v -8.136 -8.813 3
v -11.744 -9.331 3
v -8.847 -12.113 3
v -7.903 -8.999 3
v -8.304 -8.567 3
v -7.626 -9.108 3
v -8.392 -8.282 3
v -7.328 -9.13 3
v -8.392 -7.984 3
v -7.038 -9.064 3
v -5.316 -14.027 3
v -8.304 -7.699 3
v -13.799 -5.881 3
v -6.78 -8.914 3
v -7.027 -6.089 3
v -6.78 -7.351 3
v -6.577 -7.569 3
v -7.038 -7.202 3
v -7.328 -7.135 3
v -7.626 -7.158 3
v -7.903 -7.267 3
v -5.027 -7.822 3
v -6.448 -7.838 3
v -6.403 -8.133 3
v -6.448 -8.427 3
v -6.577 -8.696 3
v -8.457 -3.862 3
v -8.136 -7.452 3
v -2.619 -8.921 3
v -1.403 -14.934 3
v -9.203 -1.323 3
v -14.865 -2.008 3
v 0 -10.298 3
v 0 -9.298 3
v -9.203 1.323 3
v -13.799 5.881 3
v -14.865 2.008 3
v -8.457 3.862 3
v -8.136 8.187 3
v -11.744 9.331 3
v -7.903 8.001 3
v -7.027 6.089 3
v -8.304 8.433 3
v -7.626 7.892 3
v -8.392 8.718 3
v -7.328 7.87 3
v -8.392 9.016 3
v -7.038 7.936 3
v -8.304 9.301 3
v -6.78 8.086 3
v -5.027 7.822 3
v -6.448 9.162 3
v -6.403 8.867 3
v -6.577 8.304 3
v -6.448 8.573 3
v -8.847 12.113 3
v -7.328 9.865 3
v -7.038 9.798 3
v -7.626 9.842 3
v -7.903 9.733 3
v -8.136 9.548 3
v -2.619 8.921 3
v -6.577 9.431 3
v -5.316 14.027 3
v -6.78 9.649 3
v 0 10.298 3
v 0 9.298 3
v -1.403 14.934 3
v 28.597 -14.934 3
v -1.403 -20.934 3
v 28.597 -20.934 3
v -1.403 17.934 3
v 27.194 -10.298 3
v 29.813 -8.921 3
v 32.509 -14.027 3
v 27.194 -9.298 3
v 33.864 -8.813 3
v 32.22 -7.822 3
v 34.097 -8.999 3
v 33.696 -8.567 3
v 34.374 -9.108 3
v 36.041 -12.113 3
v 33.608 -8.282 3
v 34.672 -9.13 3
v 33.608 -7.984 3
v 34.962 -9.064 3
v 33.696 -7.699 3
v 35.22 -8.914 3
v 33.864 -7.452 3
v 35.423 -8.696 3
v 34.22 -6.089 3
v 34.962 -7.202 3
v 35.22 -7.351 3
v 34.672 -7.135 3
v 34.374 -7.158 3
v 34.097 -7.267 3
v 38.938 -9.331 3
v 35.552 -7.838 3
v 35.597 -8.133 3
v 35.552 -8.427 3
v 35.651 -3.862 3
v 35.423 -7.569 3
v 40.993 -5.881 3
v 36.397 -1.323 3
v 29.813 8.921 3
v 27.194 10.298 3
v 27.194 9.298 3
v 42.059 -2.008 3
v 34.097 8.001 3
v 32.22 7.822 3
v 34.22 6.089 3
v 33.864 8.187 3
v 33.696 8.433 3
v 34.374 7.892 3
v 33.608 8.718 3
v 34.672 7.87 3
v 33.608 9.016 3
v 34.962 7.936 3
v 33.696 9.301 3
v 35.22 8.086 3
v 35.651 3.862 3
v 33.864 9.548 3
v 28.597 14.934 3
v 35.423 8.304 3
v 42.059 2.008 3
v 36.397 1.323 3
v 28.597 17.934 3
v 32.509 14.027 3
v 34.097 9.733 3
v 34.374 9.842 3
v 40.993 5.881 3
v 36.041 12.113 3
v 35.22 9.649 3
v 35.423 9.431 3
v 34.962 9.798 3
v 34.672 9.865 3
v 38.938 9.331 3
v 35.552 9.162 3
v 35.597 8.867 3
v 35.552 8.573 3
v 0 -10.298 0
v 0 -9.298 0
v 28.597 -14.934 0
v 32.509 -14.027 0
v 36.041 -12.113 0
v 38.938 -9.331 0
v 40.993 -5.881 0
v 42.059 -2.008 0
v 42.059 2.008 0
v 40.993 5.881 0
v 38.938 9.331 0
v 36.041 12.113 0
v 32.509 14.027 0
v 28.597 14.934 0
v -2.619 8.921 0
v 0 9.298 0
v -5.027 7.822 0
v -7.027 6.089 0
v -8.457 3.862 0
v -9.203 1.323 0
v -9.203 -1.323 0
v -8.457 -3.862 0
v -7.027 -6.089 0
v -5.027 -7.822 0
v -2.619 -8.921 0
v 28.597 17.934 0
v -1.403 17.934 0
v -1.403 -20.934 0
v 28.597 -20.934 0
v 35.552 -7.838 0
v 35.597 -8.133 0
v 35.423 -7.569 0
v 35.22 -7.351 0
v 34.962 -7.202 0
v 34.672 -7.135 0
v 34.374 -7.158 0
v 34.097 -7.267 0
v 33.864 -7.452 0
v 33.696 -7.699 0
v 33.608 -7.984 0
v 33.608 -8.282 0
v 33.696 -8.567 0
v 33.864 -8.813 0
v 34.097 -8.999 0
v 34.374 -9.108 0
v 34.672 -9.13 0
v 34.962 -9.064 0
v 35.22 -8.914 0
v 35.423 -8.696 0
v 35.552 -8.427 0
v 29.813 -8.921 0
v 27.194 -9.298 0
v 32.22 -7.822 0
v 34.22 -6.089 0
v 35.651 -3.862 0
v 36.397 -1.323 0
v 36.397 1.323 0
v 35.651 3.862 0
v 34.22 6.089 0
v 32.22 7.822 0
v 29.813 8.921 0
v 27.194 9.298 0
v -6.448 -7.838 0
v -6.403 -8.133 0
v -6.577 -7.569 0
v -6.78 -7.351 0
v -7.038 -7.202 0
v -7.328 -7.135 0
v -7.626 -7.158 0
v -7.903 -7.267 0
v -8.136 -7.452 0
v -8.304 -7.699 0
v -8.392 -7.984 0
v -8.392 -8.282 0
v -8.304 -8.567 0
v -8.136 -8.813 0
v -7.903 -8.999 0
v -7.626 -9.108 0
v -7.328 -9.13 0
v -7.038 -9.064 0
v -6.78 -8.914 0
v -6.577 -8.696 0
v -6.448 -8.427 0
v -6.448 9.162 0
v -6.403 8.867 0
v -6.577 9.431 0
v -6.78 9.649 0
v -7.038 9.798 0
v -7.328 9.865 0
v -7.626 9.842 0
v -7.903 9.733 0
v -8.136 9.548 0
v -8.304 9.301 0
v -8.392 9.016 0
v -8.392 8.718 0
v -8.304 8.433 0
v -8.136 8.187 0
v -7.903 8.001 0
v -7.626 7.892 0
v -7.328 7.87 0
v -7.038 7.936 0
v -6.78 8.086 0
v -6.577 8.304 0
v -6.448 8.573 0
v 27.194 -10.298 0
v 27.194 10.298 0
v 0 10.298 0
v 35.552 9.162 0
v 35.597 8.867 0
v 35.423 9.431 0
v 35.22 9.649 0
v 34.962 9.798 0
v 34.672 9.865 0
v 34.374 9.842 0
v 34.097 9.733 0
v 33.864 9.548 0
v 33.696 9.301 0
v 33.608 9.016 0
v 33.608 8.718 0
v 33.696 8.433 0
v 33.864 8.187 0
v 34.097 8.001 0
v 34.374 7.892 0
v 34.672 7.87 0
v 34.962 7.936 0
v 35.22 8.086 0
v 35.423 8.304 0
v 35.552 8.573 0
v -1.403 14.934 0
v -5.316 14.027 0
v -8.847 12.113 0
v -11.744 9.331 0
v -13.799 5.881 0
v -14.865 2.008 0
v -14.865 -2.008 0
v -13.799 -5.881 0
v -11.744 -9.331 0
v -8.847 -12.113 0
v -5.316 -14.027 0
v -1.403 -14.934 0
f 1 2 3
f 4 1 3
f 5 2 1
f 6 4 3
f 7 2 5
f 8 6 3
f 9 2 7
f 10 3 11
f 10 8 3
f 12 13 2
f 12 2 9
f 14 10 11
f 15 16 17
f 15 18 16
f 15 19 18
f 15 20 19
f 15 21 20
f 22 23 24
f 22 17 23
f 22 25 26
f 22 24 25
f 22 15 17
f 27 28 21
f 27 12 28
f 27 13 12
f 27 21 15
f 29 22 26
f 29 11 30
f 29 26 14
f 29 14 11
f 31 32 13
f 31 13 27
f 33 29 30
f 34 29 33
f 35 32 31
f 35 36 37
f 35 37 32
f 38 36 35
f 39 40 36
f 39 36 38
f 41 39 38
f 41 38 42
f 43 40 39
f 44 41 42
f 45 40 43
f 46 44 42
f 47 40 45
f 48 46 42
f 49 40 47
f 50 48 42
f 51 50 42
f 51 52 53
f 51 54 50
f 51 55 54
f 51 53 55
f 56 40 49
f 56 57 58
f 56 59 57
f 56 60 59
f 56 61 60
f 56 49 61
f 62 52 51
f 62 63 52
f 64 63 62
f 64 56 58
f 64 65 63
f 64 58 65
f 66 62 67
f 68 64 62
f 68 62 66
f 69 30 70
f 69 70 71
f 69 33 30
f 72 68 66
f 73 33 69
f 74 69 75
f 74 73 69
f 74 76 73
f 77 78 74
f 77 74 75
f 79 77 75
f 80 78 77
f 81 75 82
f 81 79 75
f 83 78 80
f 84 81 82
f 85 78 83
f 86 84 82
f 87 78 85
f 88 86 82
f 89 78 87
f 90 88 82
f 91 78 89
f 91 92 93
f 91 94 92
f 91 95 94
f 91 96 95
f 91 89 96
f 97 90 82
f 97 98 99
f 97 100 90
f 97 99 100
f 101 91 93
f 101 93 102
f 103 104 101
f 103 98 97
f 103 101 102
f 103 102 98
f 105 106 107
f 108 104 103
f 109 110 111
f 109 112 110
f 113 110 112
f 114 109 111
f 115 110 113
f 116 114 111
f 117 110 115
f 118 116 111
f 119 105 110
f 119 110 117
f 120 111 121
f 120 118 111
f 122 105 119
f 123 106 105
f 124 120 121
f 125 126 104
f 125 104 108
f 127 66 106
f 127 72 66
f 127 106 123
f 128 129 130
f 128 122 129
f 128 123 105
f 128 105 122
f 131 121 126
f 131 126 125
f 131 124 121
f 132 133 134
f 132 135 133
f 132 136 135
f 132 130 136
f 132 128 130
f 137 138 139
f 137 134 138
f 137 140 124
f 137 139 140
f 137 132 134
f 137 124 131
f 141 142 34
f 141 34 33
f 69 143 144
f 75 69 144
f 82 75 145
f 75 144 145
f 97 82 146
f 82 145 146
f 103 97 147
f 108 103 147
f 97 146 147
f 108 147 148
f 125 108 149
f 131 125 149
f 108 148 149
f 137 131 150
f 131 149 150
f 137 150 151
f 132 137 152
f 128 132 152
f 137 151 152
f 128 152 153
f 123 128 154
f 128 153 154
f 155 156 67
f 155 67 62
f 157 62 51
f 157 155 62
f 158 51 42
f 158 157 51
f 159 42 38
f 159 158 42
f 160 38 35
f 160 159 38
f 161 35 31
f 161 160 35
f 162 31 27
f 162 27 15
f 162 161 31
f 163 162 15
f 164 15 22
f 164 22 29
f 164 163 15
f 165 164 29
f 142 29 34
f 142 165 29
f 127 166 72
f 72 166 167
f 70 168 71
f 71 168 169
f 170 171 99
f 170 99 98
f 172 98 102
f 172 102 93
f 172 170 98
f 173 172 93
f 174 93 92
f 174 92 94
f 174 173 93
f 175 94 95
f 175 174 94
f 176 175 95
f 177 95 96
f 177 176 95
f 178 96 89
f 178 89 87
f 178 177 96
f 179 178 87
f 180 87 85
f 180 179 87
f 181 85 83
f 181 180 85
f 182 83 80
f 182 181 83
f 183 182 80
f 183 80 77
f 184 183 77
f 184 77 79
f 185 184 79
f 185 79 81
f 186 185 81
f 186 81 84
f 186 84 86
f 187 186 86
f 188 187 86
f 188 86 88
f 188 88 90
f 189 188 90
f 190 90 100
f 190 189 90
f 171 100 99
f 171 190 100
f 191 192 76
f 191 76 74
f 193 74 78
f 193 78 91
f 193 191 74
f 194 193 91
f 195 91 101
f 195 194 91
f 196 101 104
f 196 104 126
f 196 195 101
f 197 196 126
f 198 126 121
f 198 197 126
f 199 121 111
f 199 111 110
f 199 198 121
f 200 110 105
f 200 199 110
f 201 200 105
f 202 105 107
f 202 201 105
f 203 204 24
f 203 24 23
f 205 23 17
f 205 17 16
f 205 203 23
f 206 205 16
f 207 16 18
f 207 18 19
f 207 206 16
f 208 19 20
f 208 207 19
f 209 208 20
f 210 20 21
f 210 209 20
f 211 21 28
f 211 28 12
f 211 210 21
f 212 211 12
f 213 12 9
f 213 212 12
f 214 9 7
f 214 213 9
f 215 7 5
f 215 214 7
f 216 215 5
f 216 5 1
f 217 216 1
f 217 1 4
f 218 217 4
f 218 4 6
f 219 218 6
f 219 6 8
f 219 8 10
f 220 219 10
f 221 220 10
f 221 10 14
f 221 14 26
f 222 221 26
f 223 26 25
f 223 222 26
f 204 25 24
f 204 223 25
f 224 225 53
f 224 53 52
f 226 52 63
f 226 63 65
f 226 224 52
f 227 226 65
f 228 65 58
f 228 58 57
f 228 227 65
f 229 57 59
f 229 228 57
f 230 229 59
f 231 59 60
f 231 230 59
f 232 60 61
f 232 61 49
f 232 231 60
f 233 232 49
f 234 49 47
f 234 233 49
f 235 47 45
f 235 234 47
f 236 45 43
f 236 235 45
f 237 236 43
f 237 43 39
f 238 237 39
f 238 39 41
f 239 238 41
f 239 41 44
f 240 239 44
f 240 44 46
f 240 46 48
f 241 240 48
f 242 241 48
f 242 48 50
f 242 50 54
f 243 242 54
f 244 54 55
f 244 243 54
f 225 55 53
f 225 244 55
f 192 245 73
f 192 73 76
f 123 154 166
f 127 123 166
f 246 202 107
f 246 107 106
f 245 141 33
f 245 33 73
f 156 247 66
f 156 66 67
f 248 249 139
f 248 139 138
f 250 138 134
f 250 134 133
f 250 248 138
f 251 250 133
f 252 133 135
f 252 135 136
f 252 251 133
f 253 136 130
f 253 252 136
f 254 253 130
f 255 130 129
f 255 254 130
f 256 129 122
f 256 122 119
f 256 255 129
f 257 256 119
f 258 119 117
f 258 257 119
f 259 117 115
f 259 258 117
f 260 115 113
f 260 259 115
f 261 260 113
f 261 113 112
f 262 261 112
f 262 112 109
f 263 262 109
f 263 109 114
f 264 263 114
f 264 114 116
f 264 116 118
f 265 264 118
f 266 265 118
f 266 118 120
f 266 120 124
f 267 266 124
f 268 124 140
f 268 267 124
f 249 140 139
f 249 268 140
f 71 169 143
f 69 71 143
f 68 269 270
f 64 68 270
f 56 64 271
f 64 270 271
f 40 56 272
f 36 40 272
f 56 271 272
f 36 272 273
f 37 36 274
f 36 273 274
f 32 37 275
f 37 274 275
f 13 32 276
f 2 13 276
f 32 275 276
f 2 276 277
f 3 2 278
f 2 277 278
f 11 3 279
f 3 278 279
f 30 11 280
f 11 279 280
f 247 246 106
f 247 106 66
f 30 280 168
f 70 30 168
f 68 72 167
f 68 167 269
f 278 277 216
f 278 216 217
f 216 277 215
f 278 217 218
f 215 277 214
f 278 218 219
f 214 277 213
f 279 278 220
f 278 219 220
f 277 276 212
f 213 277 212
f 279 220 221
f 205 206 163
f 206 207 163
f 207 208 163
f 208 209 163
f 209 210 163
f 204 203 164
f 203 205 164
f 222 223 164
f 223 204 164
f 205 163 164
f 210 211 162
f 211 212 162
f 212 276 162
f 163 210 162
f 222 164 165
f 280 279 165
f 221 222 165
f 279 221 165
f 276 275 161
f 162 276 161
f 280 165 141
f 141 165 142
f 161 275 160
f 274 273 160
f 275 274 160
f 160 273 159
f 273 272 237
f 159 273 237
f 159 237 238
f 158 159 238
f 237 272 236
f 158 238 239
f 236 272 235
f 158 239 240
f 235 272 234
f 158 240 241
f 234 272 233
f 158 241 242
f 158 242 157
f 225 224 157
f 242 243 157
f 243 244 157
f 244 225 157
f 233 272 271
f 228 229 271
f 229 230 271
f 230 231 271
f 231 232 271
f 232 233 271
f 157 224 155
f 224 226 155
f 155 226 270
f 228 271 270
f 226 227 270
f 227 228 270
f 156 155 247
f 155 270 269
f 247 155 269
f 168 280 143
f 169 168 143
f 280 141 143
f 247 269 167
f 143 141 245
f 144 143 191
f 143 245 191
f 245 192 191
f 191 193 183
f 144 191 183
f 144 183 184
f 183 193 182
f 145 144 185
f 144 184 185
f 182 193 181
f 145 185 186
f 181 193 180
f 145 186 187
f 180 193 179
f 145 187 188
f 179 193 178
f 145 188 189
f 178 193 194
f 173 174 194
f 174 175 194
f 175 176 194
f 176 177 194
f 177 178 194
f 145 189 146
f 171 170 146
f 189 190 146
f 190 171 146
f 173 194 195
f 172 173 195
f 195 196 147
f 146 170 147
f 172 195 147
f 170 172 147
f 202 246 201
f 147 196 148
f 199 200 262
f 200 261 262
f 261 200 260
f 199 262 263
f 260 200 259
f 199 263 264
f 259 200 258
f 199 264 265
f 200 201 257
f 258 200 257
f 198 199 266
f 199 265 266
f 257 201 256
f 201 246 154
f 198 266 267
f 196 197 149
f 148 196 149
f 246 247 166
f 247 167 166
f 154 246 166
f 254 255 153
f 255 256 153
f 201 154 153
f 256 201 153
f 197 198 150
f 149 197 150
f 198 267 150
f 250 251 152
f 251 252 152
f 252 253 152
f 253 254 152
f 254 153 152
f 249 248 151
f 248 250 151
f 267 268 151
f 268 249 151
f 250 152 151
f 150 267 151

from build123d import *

# Parameters (mm, degrees)
CROQUIS1_R              = 1
SALIENTE_EXTRUIR1_DEPTH = 3


with BuildPart() as part:
    # Croquis1 → Saliente-Extruir1 (new body)
    with BuildSketch(Plane.XY):
        with BuildLine():
            Line((28.59683313, -20.934226553), (28.59683313, -14.934226553))
            ThreePointArc((28.59683313, -14.934226553), (42.193666261, 0), (28.59683313, 14.934226553))
            Line((28.59683313, 14.934226553), (28.59683313, 17.934226553))
            Line((28.59683313, 17.934226553), (-1.40316687, 17.934226553))
            Line((-1.40316687, 17.934226553), (-1.40316687, 14.934226553))
            ThreePointArc((-1.40316687, 14.934226553), (-15, 0), (-1.40316687, -14.934226553))
            Line((-1.40316687, -14.934226553), (-1.40316687, -20.934226553))
            Line((-1.40316687, -20.934226553), (28.59683313, -20.934226553))
        make_face()
        with Locations((-7.40316687, 8.867372458)):
            Circle(CROQUIS1_R, mode=Mode.SUBTRACT)
        with Locations((34.59683313, 8.867372458)):
            Circle(CROQUIS1_R, mode=Mode.SUBTRACT)
        with Locations((34.59683313, -8.132627542)):
            Circle(CROQUIS1_R, mode=Mode.SUBTRACT)
        with Locations((-7.40316687, -8.132627542)):
            Circle(CROQUIS1_R, mode=Mode.SUBTRACT)
        with BuildLine():
            Line((0, -10.297541691), (27.193666261, -10.297541691))
            Line((27.193666261, -10.297541691), (27.193666261, -9.297541691))
            ThreePointArc((27.193666261, -9.297541691), (36.491207952, 0), (27.193666261, 9.297541691))
            Line((27.193666261, 9.297541691), (27.193666261, 10.297541691))
            Line((27.193666261, 10.297541691), (0, 10.297541691))
            Line((0, 10.297541691), (0, 9.297541691))
            ThreePointArc((0, 9.297541691), (-9.297541691, 0), (0, -9.297541691))
            Line((0, -9.297541691), (0, -10.297541691))
        make_face(mode=Mode.SUBTRACT)
    extrude(amount=SALIENTE_EXTRUIR1_DEPTH)


solid = part.part
